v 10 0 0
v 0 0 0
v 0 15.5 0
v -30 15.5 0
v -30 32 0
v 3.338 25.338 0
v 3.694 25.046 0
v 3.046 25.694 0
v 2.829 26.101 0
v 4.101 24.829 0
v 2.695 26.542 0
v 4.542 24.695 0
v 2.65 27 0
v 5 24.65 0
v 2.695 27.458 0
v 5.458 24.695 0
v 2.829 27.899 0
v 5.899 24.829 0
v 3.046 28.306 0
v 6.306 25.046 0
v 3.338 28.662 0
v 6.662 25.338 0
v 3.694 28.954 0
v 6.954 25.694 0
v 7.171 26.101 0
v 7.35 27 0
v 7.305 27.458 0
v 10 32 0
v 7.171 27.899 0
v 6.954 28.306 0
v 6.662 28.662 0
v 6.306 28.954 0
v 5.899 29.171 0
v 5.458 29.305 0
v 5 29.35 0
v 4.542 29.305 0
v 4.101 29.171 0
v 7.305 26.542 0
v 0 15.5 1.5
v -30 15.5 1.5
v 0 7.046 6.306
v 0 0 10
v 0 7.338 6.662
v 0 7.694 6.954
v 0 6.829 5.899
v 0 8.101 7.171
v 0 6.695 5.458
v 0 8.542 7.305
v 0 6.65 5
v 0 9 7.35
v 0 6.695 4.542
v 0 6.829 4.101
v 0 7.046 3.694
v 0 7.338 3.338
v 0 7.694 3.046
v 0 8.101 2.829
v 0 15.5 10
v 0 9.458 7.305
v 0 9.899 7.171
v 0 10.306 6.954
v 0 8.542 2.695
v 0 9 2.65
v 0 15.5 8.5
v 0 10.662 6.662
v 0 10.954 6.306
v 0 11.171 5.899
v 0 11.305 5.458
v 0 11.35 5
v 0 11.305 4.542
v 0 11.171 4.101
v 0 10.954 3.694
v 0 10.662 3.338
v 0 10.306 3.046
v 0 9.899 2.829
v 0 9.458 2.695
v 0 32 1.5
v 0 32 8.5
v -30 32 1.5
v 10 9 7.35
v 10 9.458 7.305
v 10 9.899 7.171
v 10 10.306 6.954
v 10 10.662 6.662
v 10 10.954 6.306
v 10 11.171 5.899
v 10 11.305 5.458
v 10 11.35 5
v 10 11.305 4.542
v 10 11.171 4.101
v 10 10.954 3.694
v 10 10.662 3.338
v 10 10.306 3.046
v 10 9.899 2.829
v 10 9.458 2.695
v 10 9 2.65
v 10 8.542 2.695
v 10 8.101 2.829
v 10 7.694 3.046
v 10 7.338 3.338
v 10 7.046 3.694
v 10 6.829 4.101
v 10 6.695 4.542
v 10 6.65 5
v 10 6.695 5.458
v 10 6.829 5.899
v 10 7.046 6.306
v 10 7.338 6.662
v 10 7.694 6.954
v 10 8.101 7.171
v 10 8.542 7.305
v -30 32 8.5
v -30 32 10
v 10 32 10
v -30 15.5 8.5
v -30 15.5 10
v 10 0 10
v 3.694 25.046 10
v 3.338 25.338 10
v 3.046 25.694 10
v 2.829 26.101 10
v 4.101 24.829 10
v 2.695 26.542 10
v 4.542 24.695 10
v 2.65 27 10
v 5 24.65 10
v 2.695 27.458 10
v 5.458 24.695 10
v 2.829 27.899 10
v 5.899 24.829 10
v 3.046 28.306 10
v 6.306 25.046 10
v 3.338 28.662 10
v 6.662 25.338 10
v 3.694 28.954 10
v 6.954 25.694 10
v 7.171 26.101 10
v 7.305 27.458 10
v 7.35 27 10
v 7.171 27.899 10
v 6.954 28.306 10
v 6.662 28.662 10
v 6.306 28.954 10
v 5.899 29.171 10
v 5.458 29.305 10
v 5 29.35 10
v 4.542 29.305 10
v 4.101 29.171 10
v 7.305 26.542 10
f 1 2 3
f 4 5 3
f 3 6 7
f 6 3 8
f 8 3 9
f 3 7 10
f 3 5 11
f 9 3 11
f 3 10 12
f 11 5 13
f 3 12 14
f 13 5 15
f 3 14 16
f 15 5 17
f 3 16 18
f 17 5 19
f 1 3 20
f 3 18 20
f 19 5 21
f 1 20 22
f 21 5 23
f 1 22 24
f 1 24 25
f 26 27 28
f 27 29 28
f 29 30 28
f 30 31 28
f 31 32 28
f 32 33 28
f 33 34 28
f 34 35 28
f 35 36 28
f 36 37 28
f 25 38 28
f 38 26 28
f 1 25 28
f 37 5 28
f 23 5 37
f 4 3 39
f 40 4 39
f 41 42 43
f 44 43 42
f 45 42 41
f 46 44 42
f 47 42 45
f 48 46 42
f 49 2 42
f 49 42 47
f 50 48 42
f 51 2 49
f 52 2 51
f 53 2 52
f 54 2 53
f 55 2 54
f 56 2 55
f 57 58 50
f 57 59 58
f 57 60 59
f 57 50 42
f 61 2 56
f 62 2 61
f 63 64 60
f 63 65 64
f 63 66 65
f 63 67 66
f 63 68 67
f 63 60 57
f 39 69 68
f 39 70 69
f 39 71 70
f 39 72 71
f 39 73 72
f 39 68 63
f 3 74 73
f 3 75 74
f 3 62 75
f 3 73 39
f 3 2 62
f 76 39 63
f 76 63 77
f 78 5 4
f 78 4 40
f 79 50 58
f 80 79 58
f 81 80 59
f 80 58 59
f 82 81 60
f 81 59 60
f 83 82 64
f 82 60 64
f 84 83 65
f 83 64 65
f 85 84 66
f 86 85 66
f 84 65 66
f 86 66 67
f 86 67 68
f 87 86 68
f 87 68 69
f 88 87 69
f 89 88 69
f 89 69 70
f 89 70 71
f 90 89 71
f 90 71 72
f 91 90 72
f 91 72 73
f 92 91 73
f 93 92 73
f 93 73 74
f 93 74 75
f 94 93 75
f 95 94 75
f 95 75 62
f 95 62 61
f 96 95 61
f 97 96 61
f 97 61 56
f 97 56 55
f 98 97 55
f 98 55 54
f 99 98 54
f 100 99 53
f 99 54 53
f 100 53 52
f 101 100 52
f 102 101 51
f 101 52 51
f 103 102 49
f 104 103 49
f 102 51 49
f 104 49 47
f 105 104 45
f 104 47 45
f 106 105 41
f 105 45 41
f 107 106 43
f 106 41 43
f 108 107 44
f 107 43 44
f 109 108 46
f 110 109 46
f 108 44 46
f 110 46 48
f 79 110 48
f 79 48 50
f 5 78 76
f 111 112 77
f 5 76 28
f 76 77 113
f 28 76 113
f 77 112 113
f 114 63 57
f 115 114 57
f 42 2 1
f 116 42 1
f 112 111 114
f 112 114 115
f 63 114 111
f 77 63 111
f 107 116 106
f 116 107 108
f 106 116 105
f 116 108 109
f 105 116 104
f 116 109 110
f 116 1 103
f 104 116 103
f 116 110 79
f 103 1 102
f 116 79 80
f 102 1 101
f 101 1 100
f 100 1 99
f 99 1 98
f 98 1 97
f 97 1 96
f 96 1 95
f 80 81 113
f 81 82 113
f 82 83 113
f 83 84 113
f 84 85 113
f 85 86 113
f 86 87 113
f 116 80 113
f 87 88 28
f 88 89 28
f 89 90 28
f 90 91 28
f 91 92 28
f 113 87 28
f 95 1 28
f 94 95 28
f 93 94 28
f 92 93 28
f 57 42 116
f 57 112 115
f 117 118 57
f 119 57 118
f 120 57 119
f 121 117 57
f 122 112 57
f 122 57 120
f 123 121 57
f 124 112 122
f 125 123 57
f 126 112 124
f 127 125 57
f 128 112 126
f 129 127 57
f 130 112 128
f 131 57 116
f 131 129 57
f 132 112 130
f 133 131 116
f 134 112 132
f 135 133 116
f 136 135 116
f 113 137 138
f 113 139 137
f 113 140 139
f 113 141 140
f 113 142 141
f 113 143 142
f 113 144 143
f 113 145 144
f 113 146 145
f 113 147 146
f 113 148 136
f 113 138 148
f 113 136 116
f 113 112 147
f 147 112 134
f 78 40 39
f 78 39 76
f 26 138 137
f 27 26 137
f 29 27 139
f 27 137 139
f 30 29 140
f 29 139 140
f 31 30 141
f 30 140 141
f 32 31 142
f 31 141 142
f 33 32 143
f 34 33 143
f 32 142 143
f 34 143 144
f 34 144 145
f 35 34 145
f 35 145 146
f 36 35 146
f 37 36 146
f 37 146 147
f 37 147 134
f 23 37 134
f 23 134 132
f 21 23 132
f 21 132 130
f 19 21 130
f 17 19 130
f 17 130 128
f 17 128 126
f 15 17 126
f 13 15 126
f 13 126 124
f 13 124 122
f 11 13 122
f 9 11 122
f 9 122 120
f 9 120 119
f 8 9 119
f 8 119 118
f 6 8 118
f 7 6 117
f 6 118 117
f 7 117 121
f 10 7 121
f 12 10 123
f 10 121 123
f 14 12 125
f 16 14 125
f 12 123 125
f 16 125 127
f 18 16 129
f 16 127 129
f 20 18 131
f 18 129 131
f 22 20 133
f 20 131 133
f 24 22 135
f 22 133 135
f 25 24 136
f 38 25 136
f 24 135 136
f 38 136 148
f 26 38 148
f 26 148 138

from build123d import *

# Parameters (mm, degrees)
SKETCH2_W           = 10
SKETCH2_H           = 50
BOSS_EXTRUDE1_DEPTH = 10
SKETCH6_R           = 2.35
CUT_EXTRUDE3_DEPTH  = 11
SKETCH7_R           = 2.35
CUT_EXTRUDE4_DEPTH  = 11
SKETCH8_W           = 1.5
SKETCH8_H           = 21
BOSS_EXTRUDE2_DEPTH = 30
SKETCH9_W           = 52.99414334
SKETCH9_H           = 19.059793282
CUT_EXTRUDE5_DEPTH  = 11


with BuildPart() as part:
    # Sketch2 → Boss-Extrude1 (new body)
    with BuildSketch(Plane.XY):
        with Locations((5, 25)):
            Rectangle(SKETCH2_W, SKETCH2_H)
    extrude(amount=BOSS_EXTRUDE1_DEPTH)

    # Sketch6 → Cut-Extrude3 (cut, through all)
    with BuildSketch(Plane.XY.offset(10)):
        with Locations((5, 27)):
            Circle(SKETCH6_R)
    extrude(amount=-CUT_EXTRUDE3_DEPTH, mode=Mode.SUBTRACT)

    # Sketch7 → Cut-Extrude4 (cut, through all)
    with BuildSketch(Plane.ZY):
        with Locations((5, 41)):
            Circle(SKETCH7_R)
        with Locations((5, 9)):
            Circle(SKETCH7_R)
    extrude(amount=-CUT_EXTRUDE4_DEPTH, mode=Mode.SUBTRACT)

    # Sketch8 → Boss-Extrude2 (add)
    with BuildSketch(Plane.ZY):
        with Locations((9.25, 26)):
            Rectangle(SKETCH8_W, SKETCH8_H)
        with Locations((0.75, 26)):
            Rectangle(SKETCH8_W, SKETCH8_H)
    extrude(amount=BOSS_EXTRUDE2_DEPTH)

    # Sketch9 → Cut-Extrude5 (cut, through all)
    with BuildSketch(Plane.XY.offset(10)):
        with Locations((-7.642110933, 41.529896641)):
            Rectangle(SKETCH9_W, SKETCH9_H)
    extrude(amount=-CUT_EXTRUDE5_DEPTH, mode=Mode.SUBTRACT)


solid = part.part
